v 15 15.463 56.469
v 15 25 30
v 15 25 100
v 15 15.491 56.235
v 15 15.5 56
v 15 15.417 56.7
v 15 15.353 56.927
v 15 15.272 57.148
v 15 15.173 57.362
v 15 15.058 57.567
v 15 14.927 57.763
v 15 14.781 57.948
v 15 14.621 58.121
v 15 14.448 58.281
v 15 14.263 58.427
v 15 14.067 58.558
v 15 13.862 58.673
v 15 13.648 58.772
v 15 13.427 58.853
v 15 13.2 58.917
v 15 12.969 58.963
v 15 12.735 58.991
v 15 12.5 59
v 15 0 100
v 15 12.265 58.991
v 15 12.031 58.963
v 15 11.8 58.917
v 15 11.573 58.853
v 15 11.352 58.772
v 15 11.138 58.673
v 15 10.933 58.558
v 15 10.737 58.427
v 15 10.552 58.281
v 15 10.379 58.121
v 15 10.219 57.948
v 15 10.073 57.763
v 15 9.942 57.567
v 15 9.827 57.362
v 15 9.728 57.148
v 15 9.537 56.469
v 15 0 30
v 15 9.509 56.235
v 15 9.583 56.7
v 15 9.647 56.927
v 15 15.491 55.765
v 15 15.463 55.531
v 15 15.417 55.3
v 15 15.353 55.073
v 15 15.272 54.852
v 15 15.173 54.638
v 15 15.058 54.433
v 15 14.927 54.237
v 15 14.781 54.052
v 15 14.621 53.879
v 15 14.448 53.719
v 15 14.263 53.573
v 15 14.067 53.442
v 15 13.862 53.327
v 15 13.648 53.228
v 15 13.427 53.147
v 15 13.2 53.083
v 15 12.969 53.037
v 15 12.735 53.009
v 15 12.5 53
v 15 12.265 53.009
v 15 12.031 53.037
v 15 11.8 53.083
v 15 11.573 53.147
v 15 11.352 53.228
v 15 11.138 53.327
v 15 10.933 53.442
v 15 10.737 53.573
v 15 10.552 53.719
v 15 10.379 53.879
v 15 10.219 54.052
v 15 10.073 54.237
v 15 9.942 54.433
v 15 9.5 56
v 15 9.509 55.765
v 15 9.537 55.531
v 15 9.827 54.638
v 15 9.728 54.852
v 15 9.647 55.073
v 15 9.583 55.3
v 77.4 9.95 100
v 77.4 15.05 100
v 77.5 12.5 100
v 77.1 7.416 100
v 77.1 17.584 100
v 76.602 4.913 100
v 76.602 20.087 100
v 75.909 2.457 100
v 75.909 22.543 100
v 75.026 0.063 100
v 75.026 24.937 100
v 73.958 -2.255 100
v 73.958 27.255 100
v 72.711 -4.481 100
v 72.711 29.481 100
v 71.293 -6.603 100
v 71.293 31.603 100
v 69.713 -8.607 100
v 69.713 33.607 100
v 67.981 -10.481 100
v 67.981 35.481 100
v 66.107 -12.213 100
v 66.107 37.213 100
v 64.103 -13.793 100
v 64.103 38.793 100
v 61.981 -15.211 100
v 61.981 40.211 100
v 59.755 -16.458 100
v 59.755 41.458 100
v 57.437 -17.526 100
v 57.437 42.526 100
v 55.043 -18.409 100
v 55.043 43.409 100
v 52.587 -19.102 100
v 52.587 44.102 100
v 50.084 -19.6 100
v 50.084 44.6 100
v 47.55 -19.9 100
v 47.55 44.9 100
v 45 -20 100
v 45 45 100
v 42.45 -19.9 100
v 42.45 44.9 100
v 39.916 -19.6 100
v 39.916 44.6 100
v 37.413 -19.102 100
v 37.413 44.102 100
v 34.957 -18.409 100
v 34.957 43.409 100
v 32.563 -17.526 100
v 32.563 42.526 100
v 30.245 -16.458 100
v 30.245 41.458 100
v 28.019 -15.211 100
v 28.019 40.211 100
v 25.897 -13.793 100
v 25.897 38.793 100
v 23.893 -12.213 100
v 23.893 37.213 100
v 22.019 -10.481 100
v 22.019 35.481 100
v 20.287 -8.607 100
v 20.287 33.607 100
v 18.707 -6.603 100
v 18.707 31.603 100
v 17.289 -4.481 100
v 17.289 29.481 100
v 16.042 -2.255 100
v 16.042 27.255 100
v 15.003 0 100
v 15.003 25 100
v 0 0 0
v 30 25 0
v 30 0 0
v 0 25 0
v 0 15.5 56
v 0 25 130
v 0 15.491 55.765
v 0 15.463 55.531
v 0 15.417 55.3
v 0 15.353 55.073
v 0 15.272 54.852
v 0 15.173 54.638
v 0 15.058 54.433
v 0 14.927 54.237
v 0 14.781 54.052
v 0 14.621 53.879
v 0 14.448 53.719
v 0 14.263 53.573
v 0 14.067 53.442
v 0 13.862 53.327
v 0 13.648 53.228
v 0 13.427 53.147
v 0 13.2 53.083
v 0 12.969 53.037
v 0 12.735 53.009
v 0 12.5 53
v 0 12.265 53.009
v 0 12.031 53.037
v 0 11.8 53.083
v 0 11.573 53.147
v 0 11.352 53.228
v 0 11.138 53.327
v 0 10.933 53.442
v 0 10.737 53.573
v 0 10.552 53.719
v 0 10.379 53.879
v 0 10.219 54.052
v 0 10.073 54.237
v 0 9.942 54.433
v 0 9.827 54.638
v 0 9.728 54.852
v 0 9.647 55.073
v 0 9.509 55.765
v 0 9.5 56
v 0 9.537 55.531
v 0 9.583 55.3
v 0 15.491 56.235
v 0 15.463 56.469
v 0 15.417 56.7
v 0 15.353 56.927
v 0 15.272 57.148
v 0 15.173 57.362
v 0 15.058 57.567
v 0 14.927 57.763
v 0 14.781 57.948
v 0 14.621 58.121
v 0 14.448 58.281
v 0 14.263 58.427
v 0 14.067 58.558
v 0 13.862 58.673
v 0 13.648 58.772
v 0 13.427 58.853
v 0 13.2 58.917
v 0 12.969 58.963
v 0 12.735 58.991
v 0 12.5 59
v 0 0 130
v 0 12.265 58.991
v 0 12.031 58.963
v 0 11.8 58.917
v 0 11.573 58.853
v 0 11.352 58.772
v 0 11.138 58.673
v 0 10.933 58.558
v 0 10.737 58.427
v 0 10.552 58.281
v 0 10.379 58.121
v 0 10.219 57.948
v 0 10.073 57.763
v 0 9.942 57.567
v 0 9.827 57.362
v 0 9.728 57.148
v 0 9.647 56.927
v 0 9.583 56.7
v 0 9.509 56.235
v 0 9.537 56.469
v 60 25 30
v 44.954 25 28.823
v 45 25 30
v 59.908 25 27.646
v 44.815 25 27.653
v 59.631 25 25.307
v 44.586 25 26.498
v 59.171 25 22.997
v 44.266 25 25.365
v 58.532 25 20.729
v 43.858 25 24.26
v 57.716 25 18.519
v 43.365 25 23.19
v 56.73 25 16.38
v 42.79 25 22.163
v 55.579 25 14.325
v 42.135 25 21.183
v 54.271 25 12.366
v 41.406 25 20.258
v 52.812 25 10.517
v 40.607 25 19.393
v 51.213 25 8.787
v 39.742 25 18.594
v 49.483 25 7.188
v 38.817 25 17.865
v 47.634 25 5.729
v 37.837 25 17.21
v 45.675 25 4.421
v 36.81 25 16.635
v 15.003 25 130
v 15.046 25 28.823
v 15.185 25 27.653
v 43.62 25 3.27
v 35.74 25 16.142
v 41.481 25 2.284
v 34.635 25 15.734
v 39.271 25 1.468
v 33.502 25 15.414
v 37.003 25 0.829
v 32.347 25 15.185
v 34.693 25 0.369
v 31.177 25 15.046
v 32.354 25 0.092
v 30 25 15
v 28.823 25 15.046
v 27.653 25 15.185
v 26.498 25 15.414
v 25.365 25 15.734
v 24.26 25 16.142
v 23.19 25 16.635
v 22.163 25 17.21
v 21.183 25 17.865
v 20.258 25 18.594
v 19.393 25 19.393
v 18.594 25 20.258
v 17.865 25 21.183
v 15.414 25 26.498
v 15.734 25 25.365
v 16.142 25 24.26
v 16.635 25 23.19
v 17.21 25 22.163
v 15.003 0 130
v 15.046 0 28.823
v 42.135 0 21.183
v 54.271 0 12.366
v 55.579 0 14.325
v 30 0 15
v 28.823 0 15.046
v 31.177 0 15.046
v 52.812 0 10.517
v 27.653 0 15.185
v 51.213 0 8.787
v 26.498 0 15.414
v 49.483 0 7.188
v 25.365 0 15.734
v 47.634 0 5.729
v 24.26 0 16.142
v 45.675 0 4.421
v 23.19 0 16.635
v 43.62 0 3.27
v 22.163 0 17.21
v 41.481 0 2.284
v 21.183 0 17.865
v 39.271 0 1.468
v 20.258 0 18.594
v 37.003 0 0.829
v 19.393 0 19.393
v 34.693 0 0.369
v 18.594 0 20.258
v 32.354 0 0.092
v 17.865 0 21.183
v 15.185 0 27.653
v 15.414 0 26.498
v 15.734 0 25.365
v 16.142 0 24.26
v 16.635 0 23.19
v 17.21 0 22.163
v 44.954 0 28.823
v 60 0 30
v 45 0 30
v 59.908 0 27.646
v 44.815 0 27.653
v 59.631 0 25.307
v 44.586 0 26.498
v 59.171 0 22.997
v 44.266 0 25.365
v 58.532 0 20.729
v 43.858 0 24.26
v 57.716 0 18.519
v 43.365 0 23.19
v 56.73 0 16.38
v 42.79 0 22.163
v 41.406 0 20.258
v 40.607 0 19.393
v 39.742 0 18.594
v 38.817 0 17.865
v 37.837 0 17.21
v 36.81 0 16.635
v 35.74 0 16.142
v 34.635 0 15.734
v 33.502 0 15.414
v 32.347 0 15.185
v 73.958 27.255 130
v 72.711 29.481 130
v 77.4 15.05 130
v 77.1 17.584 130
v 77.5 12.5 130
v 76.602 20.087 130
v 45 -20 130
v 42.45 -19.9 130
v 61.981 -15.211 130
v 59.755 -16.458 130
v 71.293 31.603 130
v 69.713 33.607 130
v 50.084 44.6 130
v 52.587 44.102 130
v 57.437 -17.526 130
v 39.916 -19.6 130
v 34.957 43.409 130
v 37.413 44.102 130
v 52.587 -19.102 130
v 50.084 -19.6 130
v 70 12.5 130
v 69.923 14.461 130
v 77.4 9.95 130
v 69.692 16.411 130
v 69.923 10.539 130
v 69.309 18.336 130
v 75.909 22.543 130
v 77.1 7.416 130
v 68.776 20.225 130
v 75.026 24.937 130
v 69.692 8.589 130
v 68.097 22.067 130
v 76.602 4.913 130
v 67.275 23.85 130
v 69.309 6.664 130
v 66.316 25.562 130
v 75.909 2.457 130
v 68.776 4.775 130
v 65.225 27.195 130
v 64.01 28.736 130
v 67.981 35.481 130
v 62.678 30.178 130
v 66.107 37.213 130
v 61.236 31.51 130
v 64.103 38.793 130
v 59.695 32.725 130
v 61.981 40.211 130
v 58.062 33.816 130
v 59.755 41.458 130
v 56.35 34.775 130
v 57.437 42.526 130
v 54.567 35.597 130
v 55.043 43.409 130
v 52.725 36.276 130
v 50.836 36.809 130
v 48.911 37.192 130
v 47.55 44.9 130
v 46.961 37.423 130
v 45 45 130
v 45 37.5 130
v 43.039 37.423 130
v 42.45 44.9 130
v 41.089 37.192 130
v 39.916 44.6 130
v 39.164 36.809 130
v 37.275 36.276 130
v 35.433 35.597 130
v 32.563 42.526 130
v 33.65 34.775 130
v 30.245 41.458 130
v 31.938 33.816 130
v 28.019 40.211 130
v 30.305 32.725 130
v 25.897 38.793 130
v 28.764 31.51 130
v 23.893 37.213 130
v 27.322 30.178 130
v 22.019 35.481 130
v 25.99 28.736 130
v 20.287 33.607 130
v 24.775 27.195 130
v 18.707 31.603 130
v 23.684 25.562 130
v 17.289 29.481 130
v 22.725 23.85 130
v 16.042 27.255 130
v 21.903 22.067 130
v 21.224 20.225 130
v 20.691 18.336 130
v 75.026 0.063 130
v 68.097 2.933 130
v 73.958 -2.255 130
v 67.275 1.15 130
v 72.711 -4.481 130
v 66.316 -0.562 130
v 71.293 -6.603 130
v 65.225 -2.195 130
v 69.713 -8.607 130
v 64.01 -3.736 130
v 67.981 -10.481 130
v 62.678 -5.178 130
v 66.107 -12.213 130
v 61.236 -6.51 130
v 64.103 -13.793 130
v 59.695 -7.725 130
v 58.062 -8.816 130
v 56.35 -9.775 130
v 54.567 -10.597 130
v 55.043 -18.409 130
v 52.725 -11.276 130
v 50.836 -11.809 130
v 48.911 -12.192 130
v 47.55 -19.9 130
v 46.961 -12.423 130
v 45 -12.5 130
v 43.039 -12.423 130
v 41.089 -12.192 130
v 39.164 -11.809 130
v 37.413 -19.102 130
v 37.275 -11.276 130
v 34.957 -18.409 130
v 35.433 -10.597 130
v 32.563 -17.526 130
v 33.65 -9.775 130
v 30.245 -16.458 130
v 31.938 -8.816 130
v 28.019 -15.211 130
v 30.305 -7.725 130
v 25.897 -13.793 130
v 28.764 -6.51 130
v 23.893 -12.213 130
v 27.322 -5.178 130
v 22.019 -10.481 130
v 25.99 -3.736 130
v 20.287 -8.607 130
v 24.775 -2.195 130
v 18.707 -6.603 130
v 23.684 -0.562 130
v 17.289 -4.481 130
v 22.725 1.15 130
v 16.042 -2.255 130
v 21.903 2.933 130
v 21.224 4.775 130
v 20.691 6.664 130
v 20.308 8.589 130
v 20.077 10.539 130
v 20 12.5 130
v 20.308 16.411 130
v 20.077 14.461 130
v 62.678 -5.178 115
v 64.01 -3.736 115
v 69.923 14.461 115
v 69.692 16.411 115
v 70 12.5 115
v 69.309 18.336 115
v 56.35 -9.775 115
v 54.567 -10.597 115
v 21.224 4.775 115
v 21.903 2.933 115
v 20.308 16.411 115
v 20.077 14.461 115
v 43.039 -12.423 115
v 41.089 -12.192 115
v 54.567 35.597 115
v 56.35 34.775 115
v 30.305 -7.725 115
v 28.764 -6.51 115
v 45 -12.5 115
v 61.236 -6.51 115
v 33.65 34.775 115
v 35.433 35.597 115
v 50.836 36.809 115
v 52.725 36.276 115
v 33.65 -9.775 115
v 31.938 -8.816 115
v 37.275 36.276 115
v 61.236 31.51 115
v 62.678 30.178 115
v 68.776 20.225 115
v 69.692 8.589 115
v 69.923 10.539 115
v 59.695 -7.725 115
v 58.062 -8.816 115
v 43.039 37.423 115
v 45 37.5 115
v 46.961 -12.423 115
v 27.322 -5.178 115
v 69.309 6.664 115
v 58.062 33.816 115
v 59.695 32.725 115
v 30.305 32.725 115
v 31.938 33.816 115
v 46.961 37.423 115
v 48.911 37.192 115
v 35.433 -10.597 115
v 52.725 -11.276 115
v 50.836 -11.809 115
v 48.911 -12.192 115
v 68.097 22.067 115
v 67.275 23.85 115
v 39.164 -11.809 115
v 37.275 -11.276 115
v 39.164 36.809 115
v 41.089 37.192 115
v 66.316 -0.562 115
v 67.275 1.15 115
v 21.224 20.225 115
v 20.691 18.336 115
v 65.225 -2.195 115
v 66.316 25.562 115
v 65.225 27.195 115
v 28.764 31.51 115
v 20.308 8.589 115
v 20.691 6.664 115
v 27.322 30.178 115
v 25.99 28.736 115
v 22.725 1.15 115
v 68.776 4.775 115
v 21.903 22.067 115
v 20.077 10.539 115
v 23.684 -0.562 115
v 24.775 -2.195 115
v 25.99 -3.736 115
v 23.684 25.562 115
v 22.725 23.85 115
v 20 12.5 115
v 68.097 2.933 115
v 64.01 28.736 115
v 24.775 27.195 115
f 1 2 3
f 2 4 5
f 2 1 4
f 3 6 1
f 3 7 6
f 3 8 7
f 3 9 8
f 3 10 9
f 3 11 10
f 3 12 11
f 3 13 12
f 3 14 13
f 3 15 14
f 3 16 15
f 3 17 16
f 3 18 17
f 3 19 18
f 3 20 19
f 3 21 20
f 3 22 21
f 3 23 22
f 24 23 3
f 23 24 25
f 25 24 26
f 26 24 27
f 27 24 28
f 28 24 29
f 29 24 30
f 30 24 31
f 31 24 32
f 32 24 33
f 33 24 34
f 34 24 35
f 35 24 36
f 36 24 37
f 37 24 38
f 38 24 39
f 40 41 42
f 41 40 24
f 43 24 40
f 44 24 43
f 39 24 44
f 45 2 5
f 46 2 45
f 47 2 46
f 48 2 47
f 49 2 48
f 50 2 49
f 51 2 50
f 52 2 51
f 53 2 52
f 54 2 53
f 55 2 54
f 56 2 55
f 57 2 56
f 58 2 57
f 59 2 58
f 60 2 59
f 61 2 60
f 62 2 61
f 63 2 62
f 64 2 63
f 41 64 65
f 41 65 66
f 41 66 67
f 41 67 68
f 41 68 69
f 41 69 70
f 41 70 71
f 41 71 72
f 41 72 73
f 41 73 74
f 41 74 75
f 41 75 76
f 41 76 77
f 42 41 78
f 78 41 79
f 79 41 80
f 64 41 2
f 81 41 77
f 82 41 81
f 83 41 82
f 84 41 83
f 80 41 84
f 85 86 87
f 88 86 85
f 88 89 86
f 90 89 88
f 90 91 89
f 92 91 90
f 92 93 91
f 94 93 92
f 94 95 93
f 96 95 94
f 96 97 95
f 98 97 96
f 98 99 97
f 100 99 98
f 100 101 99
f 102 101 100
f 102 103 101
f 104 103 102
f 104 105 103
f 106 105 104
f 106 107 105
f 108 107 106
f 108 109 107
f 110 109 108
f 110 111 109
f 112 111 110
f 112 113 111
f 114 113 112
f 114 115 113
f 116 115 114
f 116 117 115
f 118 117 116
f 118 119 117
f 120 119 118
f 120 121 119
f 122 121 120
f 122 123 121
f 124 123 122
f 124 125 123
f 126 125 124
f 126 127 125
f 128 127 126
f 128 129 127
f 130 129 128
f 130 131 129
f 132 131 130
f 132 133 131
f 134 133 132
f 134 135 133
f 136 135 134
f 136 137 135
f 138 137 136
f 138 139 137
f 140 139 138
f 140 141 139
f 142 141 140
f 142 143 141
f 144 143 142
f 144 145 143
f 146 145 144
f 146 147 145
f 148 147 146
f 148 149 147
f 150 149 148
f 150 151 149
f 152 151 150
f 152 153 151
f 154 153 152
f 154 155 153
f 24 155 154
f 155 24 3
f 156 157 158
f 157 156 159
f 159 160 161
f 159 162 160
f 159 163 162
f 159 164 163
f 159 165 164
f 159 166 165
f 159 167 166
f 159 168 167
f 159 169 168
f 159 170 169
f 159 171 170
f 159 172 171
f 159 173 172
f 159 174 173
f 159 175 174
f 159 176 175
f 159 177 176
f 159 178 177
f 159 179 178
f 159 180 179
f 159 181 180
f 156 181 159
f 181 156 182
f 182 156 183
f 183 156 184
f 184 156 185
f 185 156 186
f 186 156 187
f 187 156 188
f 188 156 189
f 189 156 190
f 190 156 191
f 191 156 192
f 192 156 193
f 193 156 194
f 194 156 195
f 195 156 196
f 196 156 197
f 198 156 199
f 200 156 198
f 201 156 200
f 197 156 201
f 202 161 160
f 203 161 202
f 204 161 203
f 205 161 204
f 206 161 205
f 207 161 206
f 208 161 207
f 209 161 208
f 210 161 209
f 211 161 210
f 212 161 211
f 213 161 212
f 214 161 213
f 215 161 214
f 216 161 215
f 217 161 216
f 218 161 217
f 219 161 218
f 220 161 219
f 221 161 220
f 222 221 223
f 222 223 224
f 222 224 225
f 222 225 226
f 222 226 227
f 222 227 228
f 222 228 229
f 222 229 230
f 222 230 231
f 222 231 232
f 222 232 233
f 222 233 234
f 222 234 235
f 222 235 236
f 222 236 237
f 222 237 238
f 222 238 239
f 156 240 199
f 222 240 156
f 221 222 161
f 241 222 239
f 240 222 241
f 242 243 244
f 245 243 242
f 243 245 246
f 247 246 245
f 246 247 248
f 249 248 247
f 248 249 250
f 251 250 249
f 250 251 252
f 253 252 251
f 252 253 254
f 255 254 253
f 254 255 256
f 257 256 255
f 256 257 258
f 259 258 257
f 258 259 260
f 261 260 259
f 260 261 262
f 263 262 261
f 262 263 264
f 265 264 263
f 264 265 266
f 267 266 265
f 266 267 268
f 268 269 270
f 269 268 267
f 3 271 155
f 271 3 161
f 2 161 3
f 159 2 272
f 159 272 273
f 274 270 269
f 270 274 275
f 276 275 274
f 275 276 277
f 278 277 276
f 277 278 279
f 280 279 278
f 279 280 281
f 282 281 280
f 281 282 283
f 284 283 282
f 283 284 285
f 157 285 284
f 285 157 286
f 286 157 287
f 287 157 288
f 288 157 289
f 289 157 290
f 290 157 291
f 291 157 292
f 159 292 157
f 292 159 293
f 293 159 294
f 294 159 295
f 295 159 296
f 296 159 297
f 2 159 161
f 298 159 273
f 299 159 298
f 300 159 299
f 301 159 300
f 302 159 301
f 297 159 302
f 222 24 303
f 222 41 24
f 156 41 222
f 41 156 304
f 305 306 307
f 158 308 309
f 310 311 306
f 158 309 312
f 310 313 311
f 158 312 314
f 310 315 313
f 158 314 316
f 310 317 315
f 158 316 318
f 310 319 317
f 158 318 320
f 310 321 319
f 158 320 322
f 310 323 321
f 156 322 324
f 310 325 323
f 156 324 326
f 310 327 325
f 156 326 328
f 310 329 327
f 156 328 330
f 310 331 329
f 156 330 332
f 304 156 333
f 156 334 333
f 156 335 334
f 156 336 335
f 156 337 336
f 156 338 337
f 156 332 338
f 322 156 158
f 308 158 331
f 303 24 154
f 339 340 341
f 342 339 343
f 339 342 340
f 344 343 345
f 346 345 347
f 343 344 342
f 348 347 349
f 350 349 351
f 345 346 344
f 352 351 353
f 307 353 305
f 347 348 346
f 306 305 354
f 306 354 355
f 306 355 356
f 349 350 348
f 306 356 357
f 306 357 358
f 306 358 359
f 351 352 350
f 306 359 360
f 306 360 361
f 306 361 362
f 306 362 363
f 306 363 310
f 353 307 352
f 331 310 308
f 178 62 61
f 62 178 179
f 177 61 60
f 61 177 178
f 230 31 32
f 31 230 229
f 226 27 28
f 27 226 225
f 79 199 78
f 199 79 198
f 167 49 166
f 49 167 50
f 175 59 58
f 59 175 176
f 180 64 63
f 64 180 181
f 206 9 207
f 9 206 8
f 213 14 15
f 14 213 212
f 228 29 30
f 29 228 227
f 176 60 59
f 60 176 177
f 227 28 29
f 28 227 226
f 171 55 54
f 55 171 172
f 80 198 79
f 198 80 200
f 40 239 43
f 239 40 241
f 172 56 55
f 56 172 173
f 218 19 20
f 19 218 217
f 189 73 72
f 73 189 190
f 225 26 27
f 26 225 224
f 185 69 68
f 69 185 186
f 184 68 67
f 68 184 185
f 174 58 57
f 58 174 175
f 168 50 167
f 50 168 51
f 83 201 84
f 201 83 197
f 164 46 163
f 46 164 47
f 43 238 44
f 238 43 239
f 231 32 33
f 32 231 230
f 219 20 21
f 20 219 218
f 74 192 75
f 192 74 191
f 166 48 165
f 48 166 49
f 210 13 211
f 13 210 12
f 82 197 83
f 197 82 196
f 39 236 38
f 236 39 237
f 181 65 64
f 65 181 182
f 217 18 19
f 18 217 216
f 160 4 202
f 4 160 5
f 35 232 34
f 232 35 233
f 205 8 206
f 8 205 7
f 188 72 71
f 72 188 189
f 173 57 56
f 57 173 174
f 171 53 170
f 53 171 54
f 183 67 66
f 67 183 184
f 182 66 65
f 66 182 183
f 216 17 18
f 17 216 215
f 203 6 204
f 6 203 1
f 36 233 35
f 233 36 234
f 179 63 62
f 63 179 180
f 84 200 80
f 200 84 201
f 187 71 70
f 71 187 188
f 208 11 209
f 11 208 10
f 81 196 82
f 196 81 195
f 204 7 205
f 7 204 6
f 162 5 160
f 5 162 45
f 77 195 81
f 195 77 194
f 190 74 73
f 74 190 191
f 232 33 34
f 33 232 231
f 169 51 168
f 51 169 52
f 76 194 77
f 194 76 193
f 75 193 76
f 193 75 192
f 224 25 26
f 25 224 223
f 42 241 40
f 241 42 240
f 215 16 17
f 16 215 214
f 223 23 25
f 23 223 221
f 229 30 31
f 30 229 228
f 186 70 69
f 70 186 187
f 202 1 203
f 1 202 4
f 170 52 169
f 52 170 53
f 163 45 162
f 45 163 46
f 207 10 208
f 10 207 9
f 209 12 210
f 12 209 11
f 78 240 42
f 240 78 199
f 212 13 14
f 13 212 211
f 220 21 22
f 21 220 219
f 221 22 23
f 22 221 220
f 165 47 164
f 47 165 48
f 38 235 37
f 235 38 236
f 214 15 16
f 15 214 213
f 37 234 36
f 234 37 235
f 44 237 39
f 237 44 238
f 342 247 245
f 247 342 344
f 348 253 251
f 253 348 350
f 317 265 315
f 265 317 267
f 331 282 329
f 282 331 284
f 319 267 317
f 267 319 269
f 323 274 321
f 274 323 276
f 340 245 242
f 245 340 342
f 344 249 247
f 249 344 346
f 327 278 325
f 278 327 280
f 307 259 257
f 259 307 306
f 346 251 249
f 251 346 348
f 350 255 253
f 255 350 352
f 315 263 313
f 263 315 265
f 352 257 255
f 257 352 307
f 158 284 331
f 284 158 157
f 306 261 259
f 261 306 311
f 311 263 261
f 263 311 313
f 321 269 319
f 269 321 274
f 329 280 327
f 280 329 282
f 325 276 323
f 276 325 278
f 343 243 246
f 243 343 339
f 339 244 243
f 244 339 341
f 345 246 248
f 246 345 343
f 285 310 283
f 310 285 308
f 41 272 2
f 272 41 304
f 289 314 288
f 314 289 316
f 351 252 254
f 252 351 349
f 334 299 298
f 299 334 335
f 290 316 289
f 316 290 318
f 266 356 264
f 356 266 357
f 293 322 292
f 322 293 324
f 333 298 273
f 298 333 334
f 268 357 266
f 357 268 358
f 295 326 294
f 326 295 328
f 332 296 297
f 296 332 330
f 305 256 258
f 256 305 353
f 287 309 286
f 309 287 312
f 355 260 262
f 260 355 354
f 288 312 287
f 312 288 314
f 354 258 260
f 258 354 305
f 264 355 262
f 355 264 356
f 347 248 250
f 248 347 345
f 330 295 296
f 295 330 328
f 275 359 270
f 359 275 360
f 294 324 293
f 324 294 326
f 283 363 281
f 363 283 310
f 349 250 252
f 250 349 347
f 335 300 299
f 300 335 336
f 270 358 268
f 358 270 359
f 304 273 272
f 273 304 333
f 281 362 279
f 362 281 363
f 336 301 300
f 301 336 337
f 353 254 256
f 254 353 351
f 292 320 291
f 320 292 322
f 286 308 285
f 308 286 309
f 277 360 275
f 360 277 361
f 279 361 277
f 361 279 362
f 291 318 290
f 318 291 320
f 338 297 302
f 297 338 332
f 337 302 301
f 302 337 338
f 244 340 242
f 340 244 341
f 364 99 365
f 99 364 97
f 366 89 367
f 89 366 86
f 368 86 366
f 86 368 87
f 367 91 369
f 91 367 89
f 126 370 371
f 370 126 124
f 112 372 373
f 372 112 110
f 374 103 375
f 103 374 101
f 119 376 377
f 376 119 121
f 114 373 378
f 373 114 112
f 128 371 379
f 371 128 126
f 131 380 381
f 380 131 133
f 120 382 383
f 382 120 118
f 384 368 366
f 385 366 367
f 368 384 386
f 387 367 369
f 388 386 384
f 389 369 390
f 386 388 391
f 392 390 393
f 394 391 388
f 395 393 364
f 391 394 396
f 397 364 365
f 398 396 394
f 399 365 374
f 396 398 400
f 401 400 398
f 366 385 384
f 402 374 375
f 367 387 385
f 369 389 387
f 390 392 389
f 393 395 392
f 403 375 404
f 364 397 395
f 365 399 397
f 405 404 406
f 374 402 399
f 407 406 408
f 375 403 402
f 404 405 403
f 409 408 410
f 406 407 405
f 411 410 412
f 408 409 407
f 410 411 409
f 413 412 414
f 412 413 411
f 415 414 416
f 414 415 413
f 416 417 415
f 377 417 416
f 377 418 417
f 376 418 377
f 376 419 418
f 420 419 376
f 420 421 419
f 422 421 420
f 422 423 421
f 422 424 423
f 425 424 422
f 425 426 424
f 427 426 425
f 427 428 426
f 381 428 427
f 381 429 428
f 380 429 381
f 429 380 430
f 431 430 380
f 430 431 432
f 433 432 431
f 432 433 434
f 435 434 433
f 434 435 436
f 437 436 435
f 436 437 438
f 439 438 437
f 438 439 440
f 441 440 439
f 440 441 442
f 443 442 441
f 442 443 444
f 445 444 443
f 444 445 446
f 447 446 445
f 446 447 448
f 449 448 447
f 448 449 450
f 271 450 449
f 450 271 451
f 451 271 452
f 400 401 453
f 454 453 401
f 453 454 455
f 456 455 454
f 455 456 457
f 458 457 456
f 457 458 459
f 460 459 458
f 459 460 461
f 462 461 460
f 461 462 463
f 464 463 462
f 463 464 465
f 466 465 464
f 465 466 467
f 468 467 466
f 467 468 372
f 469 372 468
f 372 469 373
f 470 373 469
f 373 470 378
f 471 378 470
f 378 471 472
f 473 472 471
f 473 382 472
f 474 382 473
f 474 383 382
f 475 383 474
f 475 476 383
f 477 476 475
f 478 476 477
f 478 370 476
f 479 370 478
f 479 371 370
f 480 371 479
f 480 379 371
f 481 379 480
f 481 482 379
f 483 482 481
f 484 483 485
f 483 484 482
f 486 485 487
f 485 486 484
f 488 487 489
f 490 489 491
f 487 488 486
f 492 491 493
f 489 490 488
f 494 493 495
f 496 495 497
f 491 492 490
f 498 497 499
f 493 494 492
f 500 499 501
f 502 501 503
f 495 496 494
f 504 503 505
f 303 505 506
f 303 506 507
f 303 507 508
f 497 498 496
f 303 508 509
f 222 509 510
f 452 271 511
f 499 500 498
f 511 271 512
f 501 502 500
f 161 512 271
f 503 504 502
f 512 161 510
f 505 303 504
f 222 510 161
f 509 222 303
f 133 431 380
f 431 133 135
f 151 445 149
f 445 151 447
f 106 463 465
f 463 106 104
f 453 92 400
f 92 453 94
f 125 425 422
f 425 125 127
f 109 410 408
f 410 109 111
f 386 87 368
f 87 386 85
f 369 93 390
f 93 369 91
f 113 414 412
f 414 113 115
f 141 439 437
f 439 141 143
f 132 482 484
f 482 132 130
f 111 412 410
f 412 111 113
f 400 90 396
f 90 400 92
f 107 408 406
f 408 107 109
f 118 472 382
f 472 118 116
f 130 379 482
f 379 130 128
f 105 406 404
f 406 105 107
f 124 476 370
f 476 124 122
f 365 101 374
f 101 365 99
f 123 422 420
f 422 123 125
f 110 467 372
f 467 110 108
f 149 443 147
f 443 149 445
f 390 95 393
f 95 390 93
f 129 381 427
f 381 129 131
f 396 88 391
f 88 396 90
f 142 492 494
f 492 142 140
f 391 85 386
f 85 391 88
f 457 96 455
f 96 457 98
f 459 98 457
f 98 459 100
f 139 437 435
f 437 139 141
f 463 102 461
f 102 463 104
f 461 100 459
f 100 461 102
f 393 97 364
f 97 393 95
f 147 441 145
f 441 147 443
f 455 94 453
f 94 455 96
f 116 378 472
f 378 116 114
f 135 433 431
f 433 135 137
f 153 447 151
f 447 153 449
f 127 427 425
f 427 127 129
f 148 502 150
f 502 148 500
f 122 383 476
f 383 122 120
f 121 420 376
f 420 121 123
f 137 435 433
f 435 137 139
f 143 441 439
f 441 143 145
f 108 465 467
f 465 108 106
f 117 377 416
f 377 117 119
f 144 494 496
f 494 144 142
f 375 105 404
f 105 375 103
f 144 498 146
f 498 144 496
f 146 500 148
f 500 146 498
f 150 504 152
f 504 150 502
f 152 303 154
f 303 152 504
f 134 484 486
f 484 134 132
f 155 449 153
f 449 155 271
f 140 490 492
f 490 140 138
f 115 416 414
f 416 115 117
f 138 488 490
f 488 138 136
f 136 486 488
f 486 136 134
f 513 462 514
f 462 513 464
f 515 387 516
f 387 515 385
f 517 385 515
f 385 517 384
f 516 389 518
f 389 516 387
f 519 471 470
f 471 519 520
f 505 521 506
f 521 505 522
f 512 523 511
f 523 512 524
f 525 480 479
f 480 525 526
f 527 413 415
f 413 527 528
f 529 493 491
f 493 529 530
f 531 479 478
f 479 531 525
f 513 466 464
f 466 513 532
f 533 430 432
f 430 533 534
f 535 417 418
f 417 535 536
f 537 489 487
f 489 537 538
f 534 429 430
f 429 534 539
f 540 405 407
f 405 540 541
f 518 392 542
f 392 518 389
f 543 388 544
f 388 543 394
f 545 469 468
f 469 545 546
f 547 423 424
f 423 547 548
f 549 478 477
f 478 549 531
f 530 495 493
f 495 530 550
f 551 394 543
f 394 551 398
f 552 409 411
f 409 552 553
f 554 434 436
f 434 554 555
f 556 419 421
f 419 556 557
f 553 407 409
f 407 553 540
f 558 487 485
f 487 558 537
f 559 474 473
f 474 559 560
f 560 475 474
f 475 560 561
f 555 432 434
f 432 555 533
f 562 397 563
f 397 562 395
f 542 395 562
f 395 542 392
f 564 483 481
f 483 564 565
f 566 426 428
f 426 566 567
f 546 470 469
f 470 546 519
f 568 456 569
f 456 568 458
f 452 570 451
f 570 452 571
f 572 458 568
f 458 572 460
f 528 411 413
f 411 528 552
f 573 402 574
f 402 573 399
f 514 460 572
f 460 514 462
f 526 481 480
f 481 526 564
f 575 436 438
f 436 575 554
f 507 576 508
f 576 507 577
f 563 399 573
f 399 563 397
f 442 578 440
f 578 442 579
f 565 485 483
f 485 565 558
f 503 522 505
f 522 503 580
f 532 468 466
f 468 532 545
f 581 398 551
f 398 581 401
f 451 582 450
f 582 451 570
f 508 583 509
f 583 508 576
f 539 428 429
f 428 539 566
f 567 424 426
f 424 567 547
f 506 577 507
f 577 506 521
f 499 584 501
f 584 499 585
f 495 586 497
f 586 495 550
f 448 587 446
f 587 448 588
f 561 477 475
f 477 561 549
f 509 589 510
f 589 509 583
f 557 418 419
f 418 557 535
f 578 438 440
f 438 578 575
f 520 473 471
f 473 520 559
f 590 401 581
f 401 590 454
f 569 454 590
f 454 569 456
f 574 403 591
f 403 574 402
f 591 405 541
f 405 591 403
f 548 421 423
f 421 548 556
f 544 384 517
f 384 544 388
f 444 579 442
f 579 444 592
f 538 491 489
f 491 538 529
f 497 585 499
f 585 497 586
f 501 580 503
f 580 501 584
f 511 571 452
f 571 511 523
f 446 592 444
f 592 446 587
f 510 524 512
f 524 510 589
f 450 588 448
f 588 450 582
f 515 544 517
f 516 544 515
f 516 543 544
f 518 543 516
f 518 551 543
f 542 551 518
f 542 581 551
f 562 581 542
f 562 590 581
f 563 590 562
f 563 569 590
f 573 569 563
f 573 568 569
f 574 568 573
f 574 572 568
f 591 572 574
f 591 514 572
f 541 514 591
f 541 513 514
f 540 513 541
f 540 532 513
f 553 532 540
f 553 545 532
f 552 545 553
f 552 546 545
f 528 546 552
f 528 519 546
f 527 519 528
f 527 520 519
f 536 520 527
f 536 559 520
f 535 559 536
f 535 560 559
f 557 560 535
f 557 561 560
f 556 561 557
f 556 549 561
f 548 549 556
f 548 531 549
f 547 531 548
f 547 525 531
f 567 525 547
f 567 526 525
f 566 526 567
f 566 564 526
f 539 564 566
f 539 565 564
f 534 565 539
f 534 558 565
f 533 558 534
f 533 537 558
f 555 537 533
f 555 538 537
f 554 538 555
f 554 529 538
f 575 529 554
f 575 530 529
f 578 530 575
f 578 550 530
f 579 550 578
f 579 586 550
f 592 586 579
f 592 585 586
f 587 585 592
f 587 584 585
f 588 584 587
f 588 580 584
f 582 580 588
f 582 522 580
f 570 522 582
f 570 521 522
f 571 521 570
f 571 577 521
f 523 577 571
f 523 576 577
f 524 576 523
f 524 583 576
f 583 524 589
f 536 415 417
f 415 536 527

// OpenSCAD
$fn = 80;
w = 25;
h = 100;
t = 15;
l = 20;
screw_r = 6/2;
candle_r = 25;
hook_r = 30;


module candle_holder(){
	difference(){
		cylinder(r= candle_r + t/2, h = 2*t);
		translate([0,0,t])
		cylinder(r= candle_r, h =t);
	}
}

module hook(){
	difference(){
		cube([t,w,h]);
		translate([0,w/2,h/2+2*screw_r])
		rotate(a=[0,90,0])
		cylinder(r=screw_r,h=t);
	}
	translate([hook_r,0,hook_r])
	rotate(a=[-90,0,0])
	difference(){
		cylinder(r=hook_r,h=w);
		cylinder(r=hook_r-t,h=w);
		translate([-hook_r,-hook_r,0])
		cube([2*hook_r,hook_r,w]);
	}
}

cube([hook_r,w,t]);
hook();
translate([0,0,h])
cube([l,w,2*t]);
translate([candle_r+l,candle_r/2,h])
candle_holder();
